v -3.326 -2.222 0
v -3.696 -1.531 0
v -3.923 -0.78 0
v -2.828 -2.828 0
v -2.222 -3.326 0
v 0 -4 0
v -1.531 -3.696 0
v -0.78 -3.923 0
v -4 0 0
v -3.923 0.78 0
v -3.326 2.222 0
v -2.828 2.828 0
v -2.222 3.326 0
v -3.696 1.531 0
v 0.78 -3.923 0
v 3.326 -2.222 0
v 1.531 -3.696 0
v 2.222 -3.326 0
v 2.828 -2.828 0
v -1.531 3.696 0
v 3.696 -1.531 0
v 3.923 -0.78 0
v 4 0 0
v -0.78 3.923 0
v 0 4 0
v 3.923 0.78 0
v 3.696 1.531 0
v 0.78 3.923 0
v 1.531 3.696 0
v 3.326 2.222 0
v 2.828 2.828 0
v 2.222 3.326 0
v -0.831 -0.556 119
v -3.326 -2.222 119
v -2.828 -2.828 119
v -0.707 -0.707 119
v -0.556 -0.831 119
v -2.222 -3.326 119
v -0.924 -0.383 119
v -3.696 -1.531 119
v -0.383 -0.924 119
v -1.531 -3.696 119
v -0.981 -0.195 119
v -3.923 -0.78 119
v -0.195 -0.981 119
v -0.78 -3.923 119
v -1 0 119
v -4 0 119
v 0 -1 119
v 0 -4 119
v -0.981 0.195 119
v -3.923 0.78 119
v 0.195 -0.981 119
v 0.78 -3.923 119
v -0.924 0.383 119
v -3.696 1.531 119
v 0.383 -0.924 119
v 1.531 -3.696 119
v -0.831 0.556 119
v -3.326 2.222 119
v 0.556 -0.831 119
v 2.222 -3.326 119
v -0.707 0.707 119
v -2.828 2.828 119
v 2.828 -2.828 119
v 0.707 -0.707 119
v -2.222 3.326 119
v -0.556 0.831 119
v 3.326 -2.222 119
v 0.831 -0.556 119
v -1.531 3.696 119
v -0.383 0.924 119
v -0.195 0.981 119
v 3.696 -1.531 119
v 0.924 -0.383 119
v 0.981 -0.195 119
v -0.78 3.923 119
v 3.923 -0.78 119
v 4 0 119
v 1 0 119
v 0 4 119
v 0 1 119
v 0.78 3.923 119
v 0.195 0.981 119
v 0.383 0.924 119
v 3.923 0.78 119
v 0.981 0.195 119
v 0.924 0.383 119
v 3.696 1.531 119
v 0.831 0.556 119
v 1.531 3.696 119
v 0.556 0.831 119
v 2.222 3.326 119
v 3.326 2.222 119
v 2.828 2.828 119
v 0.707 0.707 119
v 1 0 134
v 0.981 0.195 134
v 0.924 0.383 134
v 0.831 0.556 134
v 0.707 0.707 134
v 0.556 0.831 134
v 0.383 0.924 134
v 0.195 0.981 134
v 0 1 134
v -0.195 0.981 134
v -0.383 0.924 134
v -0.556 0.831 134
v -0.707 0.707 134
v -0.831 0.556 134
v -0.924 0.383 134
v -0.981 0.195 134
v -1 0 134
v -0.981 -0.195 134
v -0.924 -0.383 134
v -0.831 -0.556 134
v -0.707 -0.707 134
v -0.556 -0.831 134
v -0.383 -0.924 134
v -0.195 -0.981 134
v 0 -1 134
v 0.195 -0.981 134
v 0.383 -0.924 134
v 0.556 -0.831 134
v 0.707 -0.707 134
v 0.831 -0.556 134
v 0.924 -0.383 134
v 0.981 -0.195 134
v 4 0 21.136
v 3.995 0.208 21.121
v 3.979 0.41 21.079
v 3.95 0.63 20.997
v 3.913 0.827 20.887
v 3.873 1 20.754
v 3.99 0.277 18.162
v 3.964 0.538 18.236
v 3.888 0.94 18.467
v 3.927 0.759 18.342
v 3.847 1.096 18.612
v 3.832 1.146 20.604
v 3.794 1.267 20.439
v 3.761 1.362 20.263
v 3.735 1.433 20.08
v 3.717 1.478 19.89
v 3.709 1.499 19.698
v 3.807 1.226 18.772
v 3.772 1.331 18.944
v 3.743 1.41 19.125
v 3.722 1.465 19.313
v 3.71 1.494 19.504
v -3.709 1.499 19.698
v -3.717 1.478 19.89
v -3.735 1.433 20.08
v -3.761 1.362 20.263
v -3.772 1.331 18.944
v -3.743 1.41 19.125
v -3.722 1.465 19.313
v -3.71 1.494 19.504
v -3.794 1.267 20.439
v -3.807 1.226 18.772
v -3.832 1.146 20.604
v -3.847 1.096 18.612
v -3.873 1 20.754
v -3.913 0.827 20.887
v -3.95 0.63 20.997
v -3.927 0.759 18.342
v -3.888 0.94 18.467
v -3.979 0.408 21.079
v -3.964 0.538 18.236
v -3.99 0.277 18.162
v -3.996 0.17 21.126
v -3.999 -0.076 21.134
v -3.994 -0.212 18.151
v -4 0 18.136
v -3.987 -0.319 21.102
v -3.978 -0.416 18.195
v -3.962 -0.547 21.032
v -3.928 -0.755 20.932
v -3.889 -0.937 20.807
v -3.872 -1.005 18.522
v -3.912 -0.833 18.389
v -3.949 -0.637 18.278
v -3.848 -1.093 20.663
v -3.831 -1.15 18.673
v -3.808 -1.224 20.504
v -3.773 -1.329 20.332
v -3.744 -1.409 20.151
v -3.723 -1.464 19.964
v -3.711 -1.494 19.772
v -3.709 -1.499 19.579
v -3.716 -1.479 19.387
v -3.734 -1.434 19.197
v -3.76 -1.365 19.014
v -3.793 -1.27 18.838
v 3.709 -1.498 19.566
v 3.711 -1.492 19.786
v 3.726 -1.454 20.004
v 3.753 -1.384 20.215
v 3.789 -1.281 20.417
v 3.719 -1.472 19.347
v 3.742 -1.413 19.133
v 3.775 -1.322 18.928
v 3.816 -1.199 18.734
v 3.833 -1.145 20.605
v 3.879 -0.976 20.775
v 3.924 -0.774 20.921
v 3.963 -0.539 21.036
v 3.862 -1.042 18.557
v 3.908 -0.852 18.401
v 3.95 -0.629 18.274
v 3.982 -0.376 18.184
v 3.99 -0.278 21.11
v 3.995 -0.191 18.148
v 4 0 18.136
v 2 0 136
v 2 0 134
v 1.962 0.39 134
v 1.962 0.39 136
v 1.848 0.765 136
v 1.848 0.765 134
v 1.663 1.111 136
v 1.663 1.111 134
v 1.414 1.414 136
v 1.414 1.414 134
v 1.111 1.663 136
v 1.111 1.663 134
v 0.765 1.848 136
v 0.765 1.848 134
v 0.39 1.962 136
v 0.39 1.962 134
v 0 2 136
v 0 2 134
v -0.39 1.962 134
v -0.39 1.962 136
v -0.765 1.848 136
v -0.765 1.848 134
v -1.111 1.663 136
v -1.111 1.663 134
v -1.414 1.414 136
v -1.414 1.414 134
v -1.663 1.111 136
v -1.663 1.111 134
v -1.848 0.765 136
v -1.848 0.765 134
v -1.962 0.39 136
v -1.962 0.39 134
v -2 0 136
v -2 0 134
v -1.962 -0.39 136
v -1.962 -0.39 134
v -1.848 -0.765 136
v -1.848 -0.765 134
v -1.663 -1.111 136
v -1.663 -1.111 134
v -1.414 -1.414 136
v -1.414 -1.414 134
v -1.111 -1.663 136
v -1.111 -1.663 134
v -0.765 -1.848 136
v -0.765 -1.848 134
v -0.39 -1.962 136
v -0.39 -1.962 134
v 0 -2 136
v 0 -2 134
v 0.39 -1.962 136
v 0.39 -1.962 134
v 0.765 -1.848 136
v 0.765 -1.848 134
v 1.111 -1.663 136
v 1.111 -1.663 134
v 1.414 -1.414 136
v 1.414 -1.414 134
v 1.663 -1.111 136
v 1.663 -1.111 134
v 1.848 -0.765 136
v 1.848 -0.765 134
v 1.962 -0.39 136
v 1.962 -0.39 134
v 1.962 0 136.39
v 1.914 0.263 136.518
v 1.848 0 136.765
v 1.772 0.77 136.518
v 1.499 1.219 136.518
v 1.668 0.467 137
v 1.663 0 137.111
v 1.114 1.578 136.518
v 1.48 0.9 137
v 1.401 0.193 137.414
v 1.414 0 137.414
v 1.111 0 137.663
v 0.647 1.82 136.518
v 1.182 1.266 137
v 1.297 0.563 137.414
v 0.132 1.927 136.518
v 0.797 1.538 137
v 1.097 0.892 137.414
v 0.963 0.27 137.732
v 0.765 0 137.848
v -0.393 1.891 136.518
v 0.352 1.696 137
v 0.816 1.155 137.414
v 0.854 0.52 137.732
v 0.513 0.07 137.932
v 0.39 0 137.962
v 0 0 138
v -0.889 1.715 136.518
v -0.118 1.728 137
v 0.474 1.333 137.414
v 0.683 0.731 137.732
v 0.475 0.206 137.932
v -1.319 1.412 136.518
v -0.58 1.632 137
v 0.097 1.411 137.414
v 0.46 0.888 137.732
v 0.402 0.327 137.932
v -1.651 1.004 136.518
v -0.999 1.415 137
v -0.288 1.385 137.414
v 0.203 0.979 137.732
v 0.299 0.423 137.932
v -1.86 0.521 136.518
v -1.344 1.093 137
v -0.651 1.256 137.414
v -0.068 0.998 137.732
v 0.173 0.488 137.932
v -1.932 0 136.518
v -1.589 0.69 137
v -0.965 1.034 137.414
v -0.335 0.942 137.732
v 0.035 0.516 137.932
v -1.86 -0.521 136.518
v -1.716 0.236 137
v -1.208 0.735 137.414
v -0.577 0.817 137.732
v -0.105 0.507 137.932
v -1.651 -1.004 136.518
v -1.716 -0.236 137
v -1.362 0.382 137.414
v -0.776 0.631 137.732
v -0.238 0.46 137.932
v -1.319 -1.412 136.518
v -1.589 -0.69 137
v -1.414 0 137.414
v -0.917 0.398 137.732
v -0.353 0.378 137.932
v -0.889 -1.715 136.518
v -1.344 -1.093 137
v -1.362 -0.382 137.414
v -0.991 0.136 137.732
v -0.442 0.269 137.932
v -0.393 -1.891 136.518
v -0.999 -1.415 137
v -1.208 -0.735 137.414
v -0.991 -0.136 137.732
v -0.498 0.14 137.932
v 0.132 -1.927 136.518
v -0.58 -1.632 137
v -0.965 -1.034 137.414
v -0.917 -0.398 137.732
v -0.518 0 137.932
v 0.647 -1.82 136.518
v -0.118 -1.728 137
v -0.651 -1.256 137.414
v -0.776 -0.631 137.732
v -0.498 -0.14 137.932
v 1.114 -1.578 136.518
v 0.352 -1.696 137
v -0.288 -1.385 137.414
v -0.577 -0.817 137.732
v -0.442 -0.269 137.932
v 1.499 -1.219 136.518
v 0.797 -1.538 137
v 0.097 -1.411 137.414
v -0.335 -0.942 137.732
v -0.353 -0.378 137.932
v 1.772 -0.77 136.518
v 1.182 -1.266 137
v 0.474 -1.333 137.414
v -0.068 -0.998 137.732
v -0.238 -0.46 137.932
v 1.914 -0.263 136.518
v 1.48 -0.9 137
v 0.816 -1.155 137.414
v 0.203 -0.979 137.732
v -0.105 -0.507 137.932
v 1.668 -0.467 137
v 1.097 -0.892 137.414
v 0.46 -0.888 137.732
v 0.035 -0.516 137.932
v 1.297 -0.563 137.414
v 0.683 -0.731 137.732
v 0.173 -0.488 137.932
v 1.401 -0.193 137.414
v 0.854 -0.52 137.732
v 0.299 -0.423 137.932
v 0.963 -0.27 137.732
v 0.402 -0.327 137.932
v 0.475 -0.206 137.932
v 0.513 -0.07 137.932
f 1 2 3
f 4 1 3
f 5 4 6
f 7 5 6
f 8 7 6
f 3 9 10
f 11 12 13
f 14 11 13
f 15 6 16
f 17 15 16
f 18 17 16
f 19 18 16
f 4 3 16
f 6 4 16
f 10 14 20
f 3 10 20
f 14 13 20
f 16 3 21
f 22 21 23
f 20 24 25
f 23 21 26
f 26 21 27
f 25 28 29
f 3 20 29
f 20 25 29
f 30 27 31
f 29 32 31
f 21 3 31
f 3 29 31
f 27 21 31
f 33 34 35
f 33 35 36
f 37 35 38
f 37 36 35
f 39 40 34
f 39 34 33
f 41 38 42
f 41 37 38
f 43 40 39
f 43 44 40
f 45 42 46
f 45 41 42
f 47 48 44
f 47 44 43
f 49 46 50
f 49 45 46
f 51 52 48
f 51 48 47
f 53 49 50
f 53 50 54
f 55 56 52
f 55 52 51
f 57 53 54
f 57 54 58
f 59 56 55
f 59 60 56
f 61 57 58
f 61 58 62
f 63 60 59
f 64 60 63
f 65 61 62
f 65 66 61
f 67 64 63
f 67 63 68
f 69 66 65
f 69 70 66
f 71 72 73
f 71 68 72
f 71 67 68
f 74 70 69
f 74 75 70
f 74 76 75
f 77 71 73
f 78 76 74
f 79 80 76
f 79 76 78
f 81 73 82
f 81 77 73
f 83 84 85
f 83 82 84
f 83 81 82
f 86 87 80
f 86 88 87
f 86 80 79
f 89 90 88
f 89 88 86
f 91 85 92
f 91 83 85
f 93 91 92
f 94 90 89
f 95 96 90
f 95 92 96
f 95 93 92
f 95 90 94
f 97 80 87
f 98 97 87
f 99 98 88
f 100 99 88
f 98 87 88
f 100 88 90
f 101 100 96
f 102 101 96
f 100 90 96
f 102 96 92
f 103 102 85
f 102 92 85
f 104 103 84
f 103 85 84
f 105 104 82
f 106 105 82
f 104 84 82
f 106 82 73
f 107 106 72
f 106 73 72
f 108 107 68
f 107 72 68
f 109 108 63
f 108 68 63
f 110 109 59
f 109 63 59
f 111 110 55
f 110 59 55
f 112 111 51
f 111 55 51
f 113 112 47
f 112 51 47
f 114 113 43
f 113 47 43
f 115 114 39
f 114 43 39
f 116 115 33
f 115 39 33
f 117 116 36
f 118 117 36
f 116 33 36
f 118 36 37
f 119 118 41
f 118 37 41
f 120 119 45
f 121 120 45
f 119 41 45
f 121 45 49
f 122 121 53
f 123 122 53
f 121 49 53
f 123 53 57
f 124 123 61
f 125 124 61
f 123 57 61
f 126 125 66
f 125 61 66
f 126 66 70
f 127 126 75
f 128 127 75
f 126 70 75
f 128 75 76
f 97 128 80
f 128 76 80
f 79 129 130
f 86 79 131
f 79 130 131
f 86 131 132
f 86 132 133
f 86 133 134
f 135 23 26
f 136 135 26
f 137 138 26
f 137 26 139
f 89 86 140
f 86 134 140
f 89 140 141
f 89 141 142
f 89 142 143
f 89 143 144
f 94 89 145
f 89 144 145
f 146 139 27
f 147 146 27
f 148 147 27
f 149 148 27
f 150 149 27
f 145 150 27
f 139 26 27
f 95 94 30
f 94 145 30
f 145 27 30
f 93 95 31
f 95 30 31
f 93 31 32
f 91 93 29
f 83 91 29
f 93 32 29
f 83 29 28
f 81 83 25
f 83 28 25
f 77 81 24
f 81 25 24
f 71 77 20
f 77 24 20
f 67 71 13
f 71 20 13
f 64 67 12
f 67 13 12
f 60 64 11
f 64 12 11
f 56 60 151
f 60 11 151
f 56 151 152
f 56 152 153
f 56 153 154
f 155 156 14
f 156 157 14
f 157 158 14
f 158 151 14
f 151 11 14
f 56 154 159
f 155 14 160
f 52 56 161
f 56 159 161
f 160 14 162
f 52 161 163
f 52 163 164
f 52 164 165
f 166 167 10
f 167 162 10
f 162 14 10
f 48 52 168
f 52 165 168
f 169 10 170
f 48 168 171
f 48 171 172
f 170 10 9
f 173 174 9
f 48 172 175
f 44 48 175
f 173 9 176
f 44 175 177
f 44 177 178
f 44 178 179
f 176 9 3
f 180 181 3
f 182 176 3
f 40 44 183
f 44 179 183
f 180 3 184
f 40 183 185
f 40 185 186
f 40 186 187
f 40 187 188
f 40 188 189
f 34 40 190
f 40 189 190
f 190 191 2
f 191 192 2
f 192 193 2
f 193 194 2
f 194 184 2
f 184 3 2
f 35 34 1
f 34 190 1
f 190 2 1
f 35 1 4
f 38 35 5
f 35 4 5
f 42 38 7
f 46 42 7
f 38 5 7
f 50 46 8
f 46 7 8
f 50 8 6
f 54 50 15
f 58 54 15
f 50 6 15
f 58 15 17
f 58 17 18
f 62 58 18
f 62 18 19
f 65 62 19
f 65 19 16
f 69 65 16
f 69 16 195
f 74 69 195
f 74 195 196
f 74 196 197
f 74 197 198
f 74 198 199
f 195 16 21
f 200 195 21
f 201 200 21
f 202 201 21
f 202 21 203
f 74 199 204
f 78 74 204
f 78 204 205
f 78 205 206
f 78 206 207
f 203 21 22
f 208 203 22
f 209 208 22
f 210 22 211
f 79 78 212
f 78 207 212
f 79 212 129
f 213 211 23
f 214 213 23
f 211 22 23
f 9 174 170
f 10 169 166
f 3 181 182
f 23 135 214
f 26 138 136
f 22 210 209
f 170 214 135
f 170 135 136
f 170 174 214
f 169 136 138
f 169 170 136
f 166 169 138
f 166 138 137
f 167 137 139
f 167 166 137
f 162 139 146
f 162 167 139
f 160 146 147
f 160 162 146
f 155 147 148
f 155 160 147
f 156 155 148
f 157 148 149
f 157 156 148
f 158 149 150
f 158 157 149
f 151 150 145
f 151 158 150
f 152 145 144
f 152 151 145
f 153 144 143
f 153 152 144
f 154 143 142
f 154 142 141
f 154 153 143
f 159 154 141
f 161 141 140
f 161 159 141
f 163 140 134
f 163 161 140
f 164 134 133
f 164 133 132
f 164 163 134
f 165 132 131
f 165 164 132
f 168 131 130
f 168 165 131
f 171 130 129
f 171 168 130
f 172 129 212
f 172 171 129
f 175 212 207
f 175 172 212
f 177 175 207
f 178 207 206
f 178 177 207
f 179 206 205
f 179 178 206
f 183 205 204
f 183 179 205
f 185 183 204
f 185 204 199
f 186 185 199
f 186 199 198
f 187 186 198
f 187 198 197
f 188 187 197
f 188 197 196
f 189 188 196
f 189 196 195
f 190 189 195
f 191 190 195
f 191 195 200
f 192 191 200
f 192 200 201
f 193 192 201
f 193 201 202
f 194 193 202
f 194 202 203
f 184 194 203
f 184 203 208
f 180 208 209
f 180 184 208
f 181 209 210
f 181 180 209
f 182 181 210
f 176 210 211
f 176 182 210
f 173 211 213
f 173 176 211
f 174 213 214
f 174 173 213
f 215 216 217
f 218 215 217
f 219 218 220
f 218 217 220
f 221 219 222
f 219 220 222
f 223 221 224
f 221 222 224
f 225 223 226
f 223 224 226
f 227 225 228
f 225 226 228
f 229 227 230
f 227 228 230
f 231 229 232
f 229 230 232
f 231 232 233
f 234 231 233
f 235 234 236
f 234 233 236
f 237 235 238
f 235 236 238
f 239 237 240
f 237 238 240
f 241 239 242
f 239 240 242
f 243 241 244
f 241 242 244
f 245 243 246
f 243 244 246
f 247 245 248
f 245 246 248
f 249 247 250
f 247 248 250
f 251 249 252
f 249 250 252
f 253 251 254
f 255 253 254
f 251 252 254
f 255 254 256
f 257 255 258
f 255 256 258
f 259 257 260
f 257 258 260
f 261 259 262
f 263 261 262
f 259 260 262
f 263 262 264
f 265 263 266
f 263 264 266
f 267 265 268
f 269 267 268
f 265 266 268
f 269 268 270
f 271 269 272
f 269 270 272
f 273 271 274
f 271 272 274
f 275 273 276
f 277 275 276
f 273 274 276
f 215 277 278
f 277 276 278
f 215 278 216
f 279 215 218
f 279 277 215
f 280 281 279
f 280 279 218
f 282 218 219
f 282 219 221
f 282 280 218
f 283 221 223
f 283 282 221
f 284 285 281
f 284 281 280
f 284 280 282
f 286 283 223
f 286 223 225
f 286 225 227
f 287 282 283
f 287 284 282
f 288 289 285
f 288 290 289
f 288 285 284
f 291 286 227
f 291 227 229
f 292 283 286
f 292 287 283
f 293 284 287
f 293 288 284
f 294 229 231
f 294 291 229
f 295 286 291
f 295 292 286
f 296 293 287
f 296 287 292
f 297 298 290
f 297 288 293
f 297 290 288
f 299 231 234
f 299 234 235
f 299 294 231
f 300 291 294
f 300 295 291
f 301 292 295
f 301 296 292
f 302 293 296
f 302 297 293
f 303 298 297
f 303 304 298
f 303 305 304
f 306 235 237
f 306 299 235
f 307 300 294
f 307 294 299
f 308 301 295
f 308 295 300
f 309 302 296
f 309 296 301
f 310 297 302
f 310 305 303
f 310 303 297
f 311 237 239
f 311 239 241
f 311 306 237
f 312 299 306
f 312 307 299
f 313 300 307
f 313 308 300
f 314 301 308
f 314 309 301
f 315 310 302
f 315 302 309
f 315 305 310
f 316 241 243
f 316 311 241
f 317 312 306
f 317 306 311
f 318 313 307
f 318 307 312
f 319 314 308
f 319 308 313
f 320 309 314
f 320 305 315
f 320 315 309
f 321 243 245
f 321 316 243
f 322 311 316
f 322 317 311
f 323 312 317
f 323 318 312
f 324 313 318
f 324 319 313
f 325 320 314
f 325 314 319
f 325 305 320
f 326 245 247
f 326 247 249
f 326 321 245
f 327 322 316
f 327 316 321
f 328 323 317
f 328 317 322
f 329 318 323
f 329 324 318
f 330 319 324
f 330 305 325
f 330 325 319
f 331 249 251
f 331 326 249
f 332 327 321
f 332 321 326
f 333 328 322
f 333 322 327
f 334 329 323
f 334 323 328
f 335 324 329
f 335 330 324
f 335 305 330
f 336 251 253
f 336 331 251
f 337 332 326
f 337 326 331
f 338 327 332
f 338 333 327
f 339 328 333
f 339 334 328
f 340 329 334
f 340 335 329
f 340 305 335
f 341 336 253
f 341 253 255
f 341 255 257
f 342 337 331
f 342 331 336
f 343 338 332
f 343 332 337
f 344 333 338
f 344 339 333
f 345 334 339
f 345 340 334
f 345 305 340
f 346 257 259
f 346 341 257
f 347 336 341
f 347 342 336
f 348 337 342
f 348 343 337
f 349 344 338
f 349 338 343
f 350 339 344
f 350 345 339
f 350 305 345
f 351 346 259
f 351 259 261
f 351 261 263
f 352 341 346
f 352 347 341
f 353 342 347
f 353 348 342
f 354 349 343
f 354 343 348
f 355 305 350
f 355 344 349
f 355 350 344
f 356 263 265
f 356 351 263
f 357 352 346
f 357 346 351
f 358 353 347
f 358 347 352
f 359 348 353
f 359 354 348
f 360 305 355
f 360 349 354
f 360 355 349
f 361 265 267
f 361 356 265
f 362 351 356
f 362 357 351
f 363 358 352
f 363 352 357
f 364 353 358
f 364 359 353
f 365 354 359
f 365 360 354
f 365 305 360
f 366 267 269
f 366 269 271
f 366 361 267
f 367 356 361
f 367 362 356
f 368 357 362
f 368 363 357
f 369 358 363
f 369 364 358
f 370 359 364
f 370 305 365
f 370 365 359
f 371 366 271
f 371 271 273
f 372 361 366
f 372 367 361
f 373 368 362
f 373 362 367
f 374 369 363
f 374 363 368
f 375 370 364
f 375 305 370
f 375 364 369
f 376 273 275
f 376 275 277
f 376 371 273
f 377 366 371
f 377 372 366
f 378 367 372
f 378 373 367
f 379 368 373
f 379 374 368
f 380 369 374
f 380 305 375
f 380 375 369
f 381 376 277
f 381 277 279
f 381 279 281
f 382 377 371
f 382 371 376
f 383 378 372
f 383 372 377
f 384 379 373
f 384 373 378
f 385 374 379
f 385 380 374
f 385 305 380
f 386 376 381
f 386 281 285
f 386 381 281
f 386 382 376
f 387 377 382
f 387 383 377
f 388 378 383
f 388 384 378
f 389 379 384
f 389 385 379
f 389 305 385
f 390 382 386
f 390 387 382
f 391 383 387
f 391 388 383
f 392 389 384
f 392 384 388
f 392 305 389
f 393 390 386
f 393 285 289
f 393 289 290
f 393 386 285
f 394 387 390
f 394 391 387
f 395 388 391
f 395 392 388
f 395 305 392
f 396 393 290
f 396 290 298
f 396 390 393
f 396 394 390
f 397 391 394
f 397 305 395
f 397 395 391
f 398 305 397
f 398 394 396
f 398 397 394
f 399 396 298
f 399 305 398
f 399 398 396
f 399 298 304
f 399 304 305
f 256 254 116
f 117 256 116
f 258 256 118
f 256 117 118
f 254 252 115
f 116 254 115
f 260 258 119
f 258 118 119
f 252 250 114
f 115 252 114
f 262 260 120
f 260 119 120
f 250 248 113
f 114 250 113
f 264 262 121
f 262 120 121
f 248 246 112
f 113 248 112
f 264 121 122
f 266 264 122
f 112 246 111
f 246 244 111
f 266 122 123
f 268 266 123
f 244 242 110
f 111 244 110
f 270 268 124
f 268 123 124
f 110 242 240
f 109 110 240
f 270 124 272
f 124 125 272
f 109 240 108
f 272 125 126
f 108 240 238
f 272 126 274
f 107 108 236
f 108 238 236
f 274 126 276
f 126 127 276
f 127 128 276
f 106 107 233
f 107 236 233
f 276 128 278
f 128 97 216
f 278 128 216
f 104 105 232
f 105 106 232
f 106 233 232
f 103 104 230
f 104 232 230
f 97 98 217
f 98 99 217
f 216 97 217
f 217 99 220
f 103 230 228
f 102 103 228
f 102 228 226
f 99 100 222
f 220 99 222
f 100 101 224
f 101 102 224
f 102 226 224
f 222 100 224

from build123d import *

# Parameters (mm, degrees)
SZKIC1_R                                    = 4
DODANIE_WYCI_GNI_CIE1_DEPTH                 = 119
WYTNIJ_WYCI_GNI_CIE1_REACH                  = 121.134
WYTNIJ_WYCI_GNI_CIE1_END_RADIUS             = 4
SZKIC2_R                                    = 1.5
WYTNIJ_WYCI_GNI_CIE1_DIRECTION_2_REACH      = 121.134
WYTNIJ_WYCI_GNI_CIE1_DIRECTION_2_END_RADIUS = 4
SZKIC3_R                                    = 1
DODANIE_WYCI_GNI_CIE2_DEPTH                 = 15
SZKIC4_R                                    = 2
DODANIE_WYCI_GNI_CIE3_DEPTH                 = 4
ZAOKR_GLENIE1_R                             = 2


with BuildPart() as part:
    # Szkic1 → Dodanie-wyciągnięcie1 (new body)
    with BuildSketch(Plane.XY):
        Circle(SZKIC1_R)
    extrude(amount=DODANIE_WYCI_GNI_CIE1_DEPTH)

    # Wytnij-wyciągnięcie1: up to this cylinder (the profile starts inside it)
    wytnij_wyci_gni_cie1_end = Plane(origin=(0, 0, 19.63585), z_dir=(0, 0, -1)) * Cylinder(WYTNIJ_WYCI_GNI_CIE1_END_RADIUS, 251.268, mode=Mode.PRIVATE)
    # Szkic2 → Wytnij-wyciągnięcie1 (cut, up to the surface)
    with BuildSketch(Plane(origin=(0, 0, 0), x_dir=(0, 0, -1), z_dir=(1, 0, 0)), mode=Mode.PRIVATE) as wytnij_wyci_gni_cie1_sk1:
        with Locations((-19.635850317, 0)):
            Circle(SZKIC2_R)
    wytnij_wyci_gni_cie1_tool1 = extrude(wytnij_wyci_gni_cie1_sk1.sketch, amount=-WYTNIJ_WYCI_GNI_CIE1_REACH, mode=Mode.PRIVATE) & wytnij_wyci_gni_cie1_end
    add(wytnij_wyci_gni_cie1_tool1.solids().sort_by_distance((0, 0, 19.63585))[0], mode=Mode.SUBTRACT)

    # Wytnij-wyciągnięcie1 direction 2: up to this cylinder (the profile starts inside it)
    wytnij_wyci_gni_cie1_direction_2_end = Plane(origin=(0, 0, 19.63585), z_dir=(0, 0, -1)) * Cylinder(WYTNIJ_WYCI_GNI_CIE1_DIRECTION_2_END_RADIUS, 251.268, mode=Mode.PRIVATE)
    # Szkic2 → Wytnij-wyciągnięcie1 direction 2 (cut, up to the surface)
    with BuildSketch(Plane(origin=(0, 0, 0), x_dir=(0, 0, -1), z_dir=(1, 0, 0)), mode=Mode.PRIVATE) as wytnij_wyci_gni_cie1_direction_2_sk1:
        with Locations((-19.635850317, 0)):
            Circle(SZKIC2_R)
    wytnij_wyci_gni_cie1_direction_2_tool1 = extrude(wytnij_wyci_gni_cie1_direction_2_sk1.sketch, amount=WYTNIJ_WYCI_GNI_CIE1_DIRECTION_2_REACH, mode=Mode.PRIVATE) & wytnij_wyci_gni_cie1_direction_2_end
    add(wytnij_wyci_gni_cie1_direction_2_tool1.solids().sort_by_distance((0, 0, 19.63585))[0], mode=Mode.SUBTRACT)

    # Szkic3 → Dodanie-wyciągnięcie2 (add)
    with BuildSketch(Plane.XY.offset(119)):
        Circle(SZKIC3_R)
    extrude(amount=DODANIE_WYCI_GNI_CIE2_DEPTH)

    # Szkic4 → Dodanie-wyciągnięcie3 (add)
    with BuildSketch(Plane.XY.offset(134)):
        Circle(SZKIC4_R)
    extrude(amount=DODANIE_WYCI_GNI_CIE3_DEPTH)

    # Zaokrąglenie1
    zaokr_glenie1_edges = [part.edges().sort_by_distance(p)[0] for p in [
        (-2, 0, 138),
    ]]
    fillet(zaokr_glenie1_edges, radius=ZAOKR_GLENIE1_R)


solid = part.part
